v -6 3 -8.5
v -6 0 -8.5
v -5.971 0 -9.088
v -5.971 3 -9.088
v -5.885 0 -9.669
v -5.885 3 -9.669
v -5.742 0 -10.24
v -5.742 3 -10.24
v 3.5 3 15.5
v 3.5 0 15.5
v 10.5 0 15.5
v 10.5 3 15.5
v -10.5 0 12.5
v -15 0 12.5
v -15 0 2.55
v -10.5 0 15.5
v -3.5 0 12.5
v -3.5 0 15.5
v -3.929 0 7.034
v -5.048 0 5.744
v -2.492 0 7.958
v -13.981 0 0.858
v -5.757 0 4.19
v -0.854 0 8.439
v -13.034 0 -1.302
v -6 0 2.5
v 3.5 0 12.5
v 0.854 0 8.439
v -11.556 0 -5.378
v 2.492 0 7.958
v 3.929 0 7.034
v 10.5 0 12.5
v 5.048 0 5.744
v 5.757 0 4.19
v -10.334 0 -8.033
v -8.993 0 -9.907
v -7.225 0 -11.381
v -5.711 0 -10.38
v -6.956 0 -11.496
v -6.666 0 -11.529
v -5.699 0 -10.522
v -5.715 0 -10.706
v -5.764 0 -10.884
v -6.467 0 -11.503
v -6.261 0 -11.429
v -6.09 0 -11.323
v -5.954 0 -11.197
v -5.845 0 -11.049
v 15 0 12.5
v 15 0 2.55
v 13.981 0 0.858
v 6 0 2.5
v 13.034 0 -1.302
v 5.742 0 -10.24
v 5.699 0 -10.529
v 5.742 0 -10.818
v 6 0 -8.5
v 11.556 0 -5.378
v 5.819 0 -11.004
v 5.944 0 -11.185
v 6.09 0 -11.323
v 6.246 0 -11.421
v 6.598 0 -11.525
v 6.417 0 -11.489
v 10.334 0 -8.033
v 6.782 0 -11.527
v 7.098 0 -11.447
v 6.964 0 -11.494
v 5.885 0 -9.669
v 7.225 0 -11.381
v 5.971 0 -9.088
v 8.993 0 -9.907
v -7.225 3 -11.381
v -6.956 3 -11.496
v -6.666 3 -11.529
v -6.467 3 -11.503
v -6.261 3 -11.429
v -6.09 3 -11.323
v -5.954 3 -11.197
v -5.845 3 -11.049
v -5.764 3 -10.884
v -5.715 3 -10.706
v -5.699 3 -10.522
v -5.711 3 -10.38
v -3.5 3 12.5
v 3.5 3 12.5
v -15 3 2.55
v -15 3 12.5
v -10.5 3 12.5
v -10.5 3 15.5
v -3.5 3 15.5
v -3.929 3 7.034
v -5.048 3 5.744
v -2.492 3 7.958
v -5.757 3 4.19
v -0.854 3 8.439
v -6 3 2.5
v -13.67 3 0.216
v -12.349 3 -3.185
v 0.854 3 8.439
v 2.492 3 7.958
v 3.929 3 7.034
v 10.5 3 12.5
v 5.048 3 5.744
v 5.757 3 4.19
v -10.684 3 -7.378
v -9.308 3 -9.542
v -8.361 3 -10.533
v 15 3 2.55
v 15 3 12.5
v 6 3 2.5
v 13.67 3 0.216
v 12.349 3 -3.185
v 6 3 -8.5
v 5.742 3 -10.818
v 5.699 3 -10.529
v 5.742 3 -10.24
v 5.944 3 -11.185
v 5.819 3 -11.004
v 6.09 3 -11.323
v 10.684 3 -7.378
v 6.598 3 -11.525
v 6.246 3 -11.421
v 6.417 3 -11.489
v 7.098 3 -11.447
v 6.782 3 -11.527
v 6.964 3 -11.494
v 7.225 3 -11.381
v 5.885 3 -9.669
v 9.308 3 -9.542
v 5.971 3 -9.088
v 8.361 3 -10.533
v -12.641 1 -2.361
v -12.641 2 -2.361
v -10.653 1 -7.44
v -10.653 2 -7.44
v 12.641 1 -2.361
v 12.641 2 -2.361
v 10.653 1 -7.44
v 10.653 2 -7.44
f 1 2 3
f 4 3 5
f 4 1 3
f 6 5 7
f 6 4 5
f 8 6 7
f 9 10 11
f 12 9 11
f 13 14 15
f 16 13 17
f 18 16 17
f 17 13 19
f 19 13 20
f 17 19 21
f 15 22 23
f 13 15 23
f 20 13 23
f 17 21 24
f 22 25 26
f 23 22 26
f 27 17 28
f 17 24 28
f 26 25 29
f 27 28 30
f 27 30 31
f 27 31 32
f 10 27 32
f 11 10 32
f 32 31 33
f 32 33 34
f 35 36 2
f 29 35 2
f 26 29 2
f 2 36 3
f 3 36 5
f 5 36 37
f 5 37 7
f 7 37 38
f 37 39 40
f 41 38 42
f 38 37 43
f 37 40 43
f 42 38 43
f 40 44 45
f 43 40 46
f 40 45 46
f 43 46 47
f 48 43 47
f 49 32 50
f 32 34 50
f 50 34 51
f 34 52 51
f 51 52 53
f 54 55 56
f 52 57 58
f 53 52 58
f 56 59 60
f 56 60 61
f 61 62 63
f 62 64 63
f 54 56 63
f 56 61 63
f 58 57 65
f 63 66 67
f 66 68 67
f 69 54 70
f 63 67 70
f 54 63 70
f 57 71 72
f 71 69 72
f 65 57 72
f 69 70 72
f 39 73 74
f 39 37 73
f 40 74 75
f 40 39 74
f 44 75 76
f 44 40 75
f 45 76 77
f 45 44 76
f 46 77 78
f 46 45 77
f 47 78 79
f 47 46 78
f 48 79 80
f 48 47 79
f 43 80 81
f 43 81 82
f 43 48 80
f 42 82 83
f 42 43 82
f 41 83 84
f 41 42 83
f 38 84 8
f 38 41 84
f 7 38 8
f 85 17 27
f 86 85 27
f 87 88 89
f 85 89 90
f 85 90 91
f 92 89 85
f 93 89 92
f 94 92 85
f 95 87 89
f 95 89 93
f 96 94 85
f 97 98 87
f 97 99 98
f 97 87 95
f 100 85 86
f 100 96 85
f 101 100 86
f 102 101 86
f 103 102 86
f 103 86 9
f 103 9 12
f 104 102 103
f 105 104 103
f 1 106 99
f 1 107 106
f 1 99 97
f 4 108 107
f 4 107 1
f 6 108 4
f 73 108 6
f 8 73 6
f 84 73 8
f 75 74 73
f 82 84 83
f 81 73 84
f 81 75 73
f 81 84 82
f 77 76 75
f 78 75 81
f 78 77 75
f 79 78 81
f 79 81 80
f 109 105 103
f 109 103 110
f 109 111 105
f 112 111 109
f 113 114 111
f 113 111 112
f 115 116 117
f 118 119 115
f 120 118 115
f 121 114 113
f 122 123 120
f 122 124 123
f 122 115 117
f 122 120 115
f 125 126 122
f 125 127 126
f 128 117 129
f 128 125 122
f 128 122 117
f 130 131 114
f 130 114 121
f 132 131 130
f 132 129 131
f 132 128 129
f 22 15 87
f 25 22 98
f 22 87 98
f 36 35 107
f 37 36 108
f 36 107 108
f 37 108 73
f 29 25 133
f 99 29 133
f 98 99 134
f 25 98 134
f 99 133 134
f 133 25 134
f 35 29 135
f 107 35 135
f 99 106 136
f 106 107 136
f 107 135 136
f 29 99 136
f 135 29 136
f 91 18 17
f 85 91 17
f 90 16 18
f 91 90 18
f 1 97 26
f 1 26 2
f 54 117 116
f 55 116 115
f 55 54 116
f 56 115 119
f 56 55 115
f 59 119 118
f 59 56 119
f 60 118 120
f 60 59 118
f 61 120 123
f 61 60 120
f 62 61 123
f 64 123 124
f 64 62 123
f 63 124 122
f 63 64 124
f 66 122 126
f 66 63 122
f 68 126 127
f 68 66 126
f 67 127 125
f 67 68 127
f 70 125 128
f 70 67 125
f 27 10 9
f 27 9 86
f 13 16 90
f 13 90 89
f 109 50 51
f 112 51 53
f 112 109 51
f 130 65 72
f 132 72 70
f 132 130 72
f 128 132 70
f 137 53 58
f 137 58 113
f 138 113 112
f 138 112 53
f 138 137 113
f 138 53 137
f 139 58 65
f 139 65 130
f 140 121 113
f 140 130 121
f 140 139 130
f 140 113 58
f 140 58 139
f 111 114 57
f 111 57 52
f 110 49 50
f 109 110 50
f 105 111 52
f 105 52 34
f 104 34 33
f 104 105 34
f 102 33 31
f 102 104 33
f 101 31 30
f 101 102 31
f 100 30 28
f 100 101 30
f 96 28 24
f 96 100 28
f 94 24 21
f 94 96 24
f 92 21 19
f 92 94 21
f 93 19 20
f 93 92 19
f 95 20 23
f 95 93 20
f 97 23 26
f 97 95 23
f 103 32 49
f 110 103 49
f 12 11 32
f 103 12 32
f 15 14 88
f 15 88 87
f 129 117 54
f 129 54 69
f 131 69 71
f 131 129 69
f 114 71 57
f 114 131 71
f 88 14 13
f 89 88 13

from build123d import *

# Parameters (mm, degrees)
SKETCH1_W           = 30
SKETCH1_H           = 25
SKETCH1_W_2         = 7
SKETCH1_H_2         = 3
BOSS_EXTRUDE1_DEPTH = 3
CUT_EXTRUDE1_DEPTH  = 4
FILLET1_R           = 1


with BuildPart() as part:
    # Sketch1 → Boss-Extrude1 (new body)
    with BuildSketch(Plane(origin=(0, 0, 0), x_dir=(1, 0, 0), z_dir=(0, 1, 0))):
        Rectangle(SKETCH1_W, SKETCH1_H)
        with Locations((-7, -14)):
            Rectangle(SKETCH1_W_2, SKETCH1_H_2)
        with Locations((7, -14)):
            Rectangle(SKETCH1_W_2, SKETCH1_H_2)
    extrude(amount=BOSS_EXTRUDE1_DEPTH)

    # Sketch2 → Cut-Extrude1 (cut, through all)
    with BuildSketch(Plane(origin=(0, 3, 0), x_dir=(1, 0, 0), z_dir=(0, 1, 0))):
        with BuildLine():
            Line((-4.472135955, 12.5), (-15, 12.5))
            Line((-15, 12.5), (-15, -2.54996447))
            add(Edge.make_bspline(
                [(-15, -2.54996447), (-11.338987125, 2.558357454), (-12.102816027, 10.660548238), (-4.472135955, 12.5)],
                knots=[0, 0, 0, 0, 1, 1, 1, 1], degree=3))
        make_face()
        with BuildLine():
            Line((6, 8.5), (6, -2.5))
            ThreePointArc((6, -2.5), (0, -8.5), (-6, -2.5))
            Line((-6, -2.5), (-6, 8.5))
            ThreePointArc((-6, 8.5), (0, 14.5), (6, 8.5))
        make_face()
        with BuildLine():
            Line((15, 12.5), (15, -2.54996447))
            add(Edge.make_bspline(
                [(15, -2.54996447), (11.338987125, 2.558357454), (12.102816027, 10.660548238), (4.472135955, 12.5)],
                knots=[0, 0, 0, 0, 1, 1, 1, 1], degree=3))
            Line((4.472135955, 12.5), (15, 12.5))
        make_face()
    extrude(amount=-CUT_EXTRUDE1_DEPTH, mode=Mode.SUBTRACT)

    # Fillet1
    fillet1_edges = [part.edges().sort_by_distance(p)[0] for p in [
        (-4.472135955, 1.5, -12.5),
        (4.472135955, 1.5, -12.5),
    ]]
    fillet(fillet1_edges, radius=FILLET1_R)


solid = part.part
